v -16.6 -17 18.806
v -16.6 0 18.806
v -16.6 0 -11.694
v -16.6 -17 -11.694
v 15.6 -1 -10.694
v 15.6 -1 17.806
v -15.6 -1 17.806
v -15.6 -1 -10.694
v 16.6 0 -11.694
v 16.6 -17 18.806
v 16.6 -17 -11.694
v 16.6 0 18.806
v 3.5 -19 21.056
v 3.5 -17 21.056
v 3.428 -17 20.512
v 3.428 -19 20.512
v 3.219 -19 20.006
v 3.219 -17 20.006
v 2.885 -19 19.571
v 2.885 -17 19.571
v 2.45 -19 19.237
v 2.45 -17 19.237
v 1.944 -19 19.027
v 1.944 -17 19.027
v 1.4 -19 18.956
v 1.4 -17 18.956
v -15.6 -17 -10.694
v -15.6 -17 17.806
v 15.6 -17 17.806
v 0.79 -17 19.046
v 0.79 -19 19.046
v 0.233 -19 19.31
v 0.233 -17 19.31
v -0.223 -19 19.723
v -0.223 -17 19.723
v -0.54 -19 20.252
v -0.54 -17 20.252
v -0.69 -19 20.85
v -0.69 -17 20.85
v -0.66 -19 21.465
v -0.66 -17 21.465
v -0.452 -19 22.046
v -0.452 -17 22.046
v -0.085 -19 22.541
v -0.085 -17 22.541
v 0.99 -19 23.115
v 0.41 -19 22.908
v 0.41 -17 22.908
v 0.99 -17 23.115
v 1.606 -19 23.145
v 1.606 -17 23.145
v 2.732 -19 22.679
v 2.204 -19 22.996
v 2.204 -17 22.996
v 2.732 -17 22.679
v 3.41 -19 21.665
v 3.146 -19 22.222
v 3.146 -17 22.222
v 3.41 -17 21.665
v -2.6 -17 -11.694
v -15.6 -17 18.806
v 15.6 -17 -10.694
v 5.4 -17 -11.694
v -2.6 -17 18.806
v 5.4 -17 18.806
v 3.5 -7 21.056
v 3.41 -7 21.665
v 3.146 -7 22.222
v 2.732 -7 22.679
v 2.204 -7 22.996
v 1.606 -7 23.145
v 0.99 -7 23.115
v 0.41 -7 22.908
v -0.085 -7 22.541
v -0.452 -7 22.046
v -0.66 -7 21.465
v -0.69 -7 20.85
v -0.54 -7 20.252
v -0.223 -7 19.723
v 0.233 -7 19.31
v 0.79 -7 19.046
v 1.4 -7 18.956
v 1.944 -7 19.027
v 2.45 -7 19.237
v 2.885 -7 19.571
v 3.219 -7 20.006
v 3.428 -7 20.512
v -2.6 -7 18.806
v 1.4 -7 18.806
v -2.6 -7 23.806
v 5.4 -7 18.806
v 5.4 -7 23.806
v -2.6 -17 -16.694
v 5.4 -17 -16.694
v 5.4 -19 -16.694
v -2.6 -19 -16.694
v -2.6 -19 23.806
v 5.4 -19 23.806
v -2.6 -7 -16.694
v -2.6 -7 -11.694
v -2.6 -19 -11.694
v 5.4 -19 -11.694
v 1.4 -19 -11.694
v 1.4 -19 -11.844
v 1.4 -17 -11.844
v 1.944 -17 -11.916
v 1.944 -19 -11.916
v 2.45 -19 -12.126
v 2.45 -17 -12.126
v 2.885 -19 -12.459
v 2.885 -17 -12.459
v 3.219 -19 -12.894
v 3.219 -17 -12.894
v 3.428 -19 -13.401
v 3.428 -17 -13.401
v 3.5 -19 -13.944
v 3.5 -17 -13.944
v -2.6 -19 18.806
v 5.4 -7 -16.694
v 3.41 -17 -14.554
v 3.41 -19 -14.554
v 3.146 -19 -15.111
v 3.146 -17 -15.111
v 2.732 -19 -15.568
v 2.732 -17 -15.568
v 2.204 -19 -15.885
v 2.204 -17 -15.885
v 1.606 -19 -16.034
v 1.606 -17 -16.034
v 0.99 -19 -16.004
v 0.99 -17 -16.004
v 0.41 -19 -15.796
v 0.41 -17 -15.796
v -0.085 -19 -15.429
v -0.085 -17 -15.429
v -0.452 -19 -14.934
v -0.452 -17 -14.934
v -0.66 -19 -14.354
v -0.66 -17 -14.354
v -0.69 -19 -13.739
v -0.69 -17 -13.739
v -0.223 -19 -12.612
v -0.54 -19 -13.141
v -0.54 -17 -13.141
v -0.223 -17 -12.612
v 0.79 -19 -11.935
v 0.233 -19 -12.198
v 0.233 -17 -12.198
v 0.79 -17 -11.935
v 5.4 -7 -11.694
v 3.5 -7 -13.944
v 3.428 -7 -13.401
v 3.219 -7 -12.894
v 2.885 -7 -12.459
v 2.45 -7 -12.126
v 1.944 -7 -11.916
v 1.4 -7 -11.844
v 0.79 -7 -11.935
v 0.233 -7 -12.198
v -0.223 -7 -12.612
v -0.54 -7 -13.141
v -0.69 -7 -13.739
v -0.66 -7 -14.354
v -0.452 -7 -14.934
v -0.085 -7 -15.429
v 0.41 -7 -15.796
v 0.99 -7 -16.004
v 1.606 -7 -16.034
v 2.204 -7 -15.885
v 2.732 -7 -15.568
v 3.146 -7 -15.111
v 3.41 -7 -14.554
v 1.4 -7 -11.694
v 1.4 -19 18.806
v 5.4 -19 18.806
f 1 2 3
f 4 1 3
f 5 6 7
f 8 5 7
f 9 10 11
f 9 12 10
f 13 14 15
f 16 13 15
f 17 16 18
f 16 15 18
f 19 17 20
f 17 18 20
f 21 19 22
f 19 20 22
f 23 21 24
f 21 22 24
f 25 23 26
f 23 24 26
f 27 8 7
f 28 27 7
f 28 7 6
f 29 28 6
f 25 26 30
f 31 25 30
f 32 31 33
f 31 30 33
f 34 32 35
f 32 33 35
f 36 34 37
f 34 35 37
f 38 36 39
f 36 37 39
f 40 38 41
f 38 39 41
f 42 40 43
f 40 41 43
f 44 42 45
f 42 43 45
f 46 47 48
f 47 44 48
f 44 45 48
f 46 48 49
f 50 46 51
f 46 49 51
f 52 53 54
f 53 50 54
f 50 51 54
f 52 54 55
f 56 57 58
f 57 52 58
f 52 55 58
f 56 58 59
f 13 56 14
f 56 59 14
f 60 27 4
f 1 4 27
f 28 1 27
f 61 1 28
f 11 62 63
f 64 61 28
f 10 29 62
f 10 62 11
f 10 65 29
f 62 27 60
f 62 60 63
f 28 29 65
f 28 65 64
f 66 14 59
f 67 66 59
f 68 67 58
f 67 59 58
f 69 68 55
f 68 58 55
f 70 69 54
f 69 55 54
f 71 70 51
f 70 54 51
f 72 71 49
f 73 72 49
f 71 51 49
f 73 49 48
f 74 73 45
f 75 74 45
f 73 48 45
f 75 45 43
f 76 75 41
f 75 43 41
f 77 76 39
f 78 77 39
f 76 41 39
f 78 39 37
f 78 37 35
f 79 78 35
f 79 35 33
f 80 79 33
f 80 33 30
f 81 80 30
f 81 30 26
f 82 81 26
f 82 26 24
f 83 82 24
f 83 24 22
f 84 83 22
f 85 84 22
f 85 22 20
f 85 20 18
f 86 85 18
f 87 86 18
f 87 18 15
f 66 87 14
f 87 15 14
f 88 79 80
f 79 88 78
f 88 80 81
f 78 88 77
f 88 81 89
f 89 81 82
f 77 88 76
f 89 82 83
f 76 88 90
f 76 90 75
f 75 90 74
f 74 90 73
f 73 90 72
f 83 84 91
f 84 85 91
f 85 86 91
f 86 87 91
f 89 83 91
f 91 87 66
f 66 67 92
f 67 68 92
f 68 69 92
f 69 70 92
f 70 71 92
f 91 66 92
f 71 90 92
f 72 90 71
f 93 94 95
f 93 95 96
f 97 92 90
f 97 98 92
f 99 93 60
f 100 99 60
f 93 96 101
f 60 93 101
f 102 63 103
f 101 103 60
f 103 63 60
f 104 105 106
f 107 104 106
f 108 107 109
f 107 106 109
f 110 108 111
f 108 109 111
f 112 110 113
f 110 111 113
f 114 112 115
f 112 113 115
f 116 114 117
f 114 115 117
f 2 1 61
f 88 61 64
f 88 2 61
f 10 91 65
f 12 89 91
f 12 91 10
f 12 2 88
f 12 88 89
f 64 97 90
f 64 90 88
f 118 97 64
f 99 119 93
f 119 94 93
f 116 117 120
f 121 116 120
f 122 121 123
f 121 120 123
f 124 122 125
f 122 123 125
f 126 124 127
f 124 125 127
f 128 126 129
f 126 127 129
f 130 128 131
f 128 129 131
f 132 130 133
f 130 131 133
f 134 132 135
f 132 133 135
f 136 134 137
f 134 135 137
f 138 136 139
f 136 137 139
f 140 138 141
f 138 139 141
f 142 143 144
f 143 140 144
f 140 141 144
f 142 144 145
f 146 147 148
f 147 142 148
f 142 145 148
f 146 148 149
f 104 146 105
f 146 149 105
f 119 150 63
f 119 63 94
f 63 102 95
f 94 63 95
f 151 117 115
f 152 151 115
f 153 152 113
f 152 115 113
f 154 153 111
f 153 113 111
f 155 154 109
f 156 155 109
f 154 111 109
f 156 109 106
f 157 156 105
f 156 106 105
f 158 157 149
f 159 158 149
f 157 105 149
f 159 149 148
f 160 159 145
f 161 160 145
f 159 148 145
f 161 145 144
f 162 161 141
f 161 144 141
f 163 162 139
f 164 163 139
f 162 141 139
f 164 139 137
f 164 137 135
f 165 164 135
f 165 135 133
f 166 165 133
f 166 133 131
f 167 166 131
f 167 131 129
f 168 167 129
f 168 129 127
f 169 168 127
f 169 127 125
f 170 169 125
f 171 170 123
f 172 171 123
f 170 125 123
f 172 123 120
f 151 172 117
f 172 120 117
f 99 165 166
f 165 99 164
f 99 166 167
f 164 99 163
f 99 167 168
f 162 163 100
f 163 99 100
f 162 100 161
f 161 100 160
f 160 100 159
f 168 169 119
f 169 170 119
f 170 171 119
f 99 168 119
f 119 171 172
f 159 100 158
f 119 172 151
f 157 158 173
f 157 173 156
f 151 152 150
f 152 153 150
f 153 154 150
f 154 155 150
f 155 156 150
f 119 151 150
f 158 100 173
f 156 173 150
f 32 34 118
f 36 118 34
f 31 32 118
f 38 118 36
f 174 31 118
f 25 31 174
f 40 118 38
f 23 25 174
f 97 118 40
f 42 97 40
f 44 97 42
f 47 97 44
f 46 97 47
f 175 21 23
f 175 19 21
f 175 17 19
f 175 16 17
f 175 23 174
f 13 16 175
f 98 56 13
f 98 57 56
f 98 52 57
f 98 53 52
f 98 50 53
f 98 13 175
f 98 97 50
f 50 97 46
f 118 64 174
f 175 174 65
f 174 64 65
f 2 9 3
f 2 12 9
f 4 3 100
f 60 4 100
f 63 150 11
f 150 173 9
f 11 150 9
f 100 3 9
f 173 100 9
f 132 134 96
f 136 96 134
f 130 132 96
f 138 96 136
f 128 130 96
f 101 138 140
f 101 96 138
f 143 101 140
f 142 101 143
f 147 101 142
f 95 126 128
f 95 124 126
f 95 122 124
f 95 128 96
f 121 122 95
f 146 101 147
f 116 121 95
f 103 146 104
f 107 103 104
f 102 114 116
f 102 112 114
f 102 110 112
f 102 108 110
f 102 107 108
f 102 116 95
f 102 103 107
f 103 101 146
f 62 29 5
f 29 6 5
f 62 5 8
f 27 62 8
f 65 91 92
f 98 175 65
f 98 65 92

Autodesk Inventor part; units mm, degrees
ref_plane "YZ Plane" through (0, 0, 0) normal (1, 0, 0) x (0, 1, 0)
ref_plane "XZ Plane" through (0, 0, 0) normal (0, 1, 0) x (-1, 0, 0)
ref_plane "XY Plane" through (0, 0, 0) normal (0, 0, 1) x (1, 0, 0)
sketch "Sketch10" plane through (0, 0, 0) normal (0, 1, 0) x (-1, 0, 0)
  line L0 (16.6, 18.8056) -> (-16.6, 18.8056)
  line L1 (-16.6, 18.8056) -> (-16.6, -11.6944)
  line L2 (-16.6, -11.6944) -> (16.5, -11.6944)
  line L3 (16.6, 18.8056) -> (16.6, -11.6944)
  line L4 (16.6, 18.8056) -> (47.1, 18.8056) construction
  line L5 (16.6, -11.6944) -> (16.5, -11.6944)
  point P0 (0, 0)
  dimension "d53" = 33.2
  dimension "d54" = 30.5
  dimension "d55" = 90
extrude "Extrusion8" add sketch "Sketch10" against normal blind 1
sketch "Sketch11" plane through (0, -1, 0) normal (0, -1, 0) x (1, 0, 0)
  line L0 (16.6, 18.8056) -> (-16.6, 18.8056) projected
  line L1 (-16.6, 18.8056) -> (-15.6, 18.8056)
  line L2 (-15.6, 18.8056) -> (-15.6, 17.8056)
  line L3 (-15.6, 17.8056) -> (15.6, 17.8056)
  line L4 (15.6, 17.8056) -> (15.6, -10.6944)
  line L5 (16.6, -11.6944) -> (16.6, 18.8056) projected
  line L6 (15.6, -10.6944) -> (-15.6, -10.6944)
  line L7 (-15.6, -10.6944) -> (-15.6, 17.8056)
  line L8 (-16.6, -11.6944) -> (16.6, -11.6944) projected
  line L9 (16.6, -11.6944) -> (16.6, 18.8056) projected
  line L10 (16.6, 18.8056) -> (-16.6, 18.8056) projected
  line L11 (-16.6, 18.8056) -> (-16.6, -11.6944) projected
  point P0 (0, 0)
  dimension "d58" = 1
  dimension "d59" = 1
  dimension "d60" = 31.2
  dimension "d61" = 28.5
  dimension "d62" = 90
extrude "Extrusion9" add sketch "Sketch11" along normal blind 16
sketch "Sketch12" plane through (0, -17, 0) normal (0, -1, 0) x (1, 0, 0)
  point P0 (0, 0)
sketch "Sketch13" plane through (0, -17, 0) normal (0, -1, 0) x (1, 0, 0)
  line L0 (-16.6, -11.6944) -> (-16.6, 18.8056) projected
  line L1 (-16.6, 3.5556) -> (1.4, 3.5556)
  line L2 (1.4, 3.5556) -> (1.4, 21.0556)
  line L3 (1.4, 21.0556) -> (1.4, -13.9444)
  circle A0 centre (1.4, 21.0556) radius 2.1
  circle A1 centre (1.4, -13.9444) radius 2.1
  line L4 (-16.6, 18.8056) -> (16.6, 18.8056) projected
  line L5 (1.4, 18.8056) -> (5.4, 18.8056)
  line L6 (5.4, 18.8056) -> (5.4, 23.8056)
  line L7 (5.4, 23.8056) -> (-2.6, 23.8056)
  line L8 (-2.6, 23.8056) -> (-2.6, 18.8056)
  line L9 (16.6, -11.6944) -> (-16.6, -11.6944) projected
  line L10 (5.4, -11.6944) -> (5.4, -16.6944)
  line L11 (5.4, -16.6944) -> (-2.6, -16.6944)
  line L12 (-2.6, -16.6944) -> (-2.6, -11.6944)
  point P0 (0, 0)
  dimension "d65" = 18
  dimension "d66" = 17.5
  dimension "d67" = 35
  dimension "d68" = 4.2
  dimension "d69" = 4.2
  dimension "d70" = 4
  dimension "d71" = 5
  dimension "d72" = 90
  dimension "d73" = 8
  dimension "d74" = 5
extrude "Extrusion10" add sketch "Sketch13" against normal blind 10 contours L9 L10 L11 L12 | L8 L7 L6 L4
extrude "Extrusion11" add sketch "Sketch13" along normal blind 2 contours L9 L10 L11 L12 | L8 L7 L6 L4
properties part number "shell"
